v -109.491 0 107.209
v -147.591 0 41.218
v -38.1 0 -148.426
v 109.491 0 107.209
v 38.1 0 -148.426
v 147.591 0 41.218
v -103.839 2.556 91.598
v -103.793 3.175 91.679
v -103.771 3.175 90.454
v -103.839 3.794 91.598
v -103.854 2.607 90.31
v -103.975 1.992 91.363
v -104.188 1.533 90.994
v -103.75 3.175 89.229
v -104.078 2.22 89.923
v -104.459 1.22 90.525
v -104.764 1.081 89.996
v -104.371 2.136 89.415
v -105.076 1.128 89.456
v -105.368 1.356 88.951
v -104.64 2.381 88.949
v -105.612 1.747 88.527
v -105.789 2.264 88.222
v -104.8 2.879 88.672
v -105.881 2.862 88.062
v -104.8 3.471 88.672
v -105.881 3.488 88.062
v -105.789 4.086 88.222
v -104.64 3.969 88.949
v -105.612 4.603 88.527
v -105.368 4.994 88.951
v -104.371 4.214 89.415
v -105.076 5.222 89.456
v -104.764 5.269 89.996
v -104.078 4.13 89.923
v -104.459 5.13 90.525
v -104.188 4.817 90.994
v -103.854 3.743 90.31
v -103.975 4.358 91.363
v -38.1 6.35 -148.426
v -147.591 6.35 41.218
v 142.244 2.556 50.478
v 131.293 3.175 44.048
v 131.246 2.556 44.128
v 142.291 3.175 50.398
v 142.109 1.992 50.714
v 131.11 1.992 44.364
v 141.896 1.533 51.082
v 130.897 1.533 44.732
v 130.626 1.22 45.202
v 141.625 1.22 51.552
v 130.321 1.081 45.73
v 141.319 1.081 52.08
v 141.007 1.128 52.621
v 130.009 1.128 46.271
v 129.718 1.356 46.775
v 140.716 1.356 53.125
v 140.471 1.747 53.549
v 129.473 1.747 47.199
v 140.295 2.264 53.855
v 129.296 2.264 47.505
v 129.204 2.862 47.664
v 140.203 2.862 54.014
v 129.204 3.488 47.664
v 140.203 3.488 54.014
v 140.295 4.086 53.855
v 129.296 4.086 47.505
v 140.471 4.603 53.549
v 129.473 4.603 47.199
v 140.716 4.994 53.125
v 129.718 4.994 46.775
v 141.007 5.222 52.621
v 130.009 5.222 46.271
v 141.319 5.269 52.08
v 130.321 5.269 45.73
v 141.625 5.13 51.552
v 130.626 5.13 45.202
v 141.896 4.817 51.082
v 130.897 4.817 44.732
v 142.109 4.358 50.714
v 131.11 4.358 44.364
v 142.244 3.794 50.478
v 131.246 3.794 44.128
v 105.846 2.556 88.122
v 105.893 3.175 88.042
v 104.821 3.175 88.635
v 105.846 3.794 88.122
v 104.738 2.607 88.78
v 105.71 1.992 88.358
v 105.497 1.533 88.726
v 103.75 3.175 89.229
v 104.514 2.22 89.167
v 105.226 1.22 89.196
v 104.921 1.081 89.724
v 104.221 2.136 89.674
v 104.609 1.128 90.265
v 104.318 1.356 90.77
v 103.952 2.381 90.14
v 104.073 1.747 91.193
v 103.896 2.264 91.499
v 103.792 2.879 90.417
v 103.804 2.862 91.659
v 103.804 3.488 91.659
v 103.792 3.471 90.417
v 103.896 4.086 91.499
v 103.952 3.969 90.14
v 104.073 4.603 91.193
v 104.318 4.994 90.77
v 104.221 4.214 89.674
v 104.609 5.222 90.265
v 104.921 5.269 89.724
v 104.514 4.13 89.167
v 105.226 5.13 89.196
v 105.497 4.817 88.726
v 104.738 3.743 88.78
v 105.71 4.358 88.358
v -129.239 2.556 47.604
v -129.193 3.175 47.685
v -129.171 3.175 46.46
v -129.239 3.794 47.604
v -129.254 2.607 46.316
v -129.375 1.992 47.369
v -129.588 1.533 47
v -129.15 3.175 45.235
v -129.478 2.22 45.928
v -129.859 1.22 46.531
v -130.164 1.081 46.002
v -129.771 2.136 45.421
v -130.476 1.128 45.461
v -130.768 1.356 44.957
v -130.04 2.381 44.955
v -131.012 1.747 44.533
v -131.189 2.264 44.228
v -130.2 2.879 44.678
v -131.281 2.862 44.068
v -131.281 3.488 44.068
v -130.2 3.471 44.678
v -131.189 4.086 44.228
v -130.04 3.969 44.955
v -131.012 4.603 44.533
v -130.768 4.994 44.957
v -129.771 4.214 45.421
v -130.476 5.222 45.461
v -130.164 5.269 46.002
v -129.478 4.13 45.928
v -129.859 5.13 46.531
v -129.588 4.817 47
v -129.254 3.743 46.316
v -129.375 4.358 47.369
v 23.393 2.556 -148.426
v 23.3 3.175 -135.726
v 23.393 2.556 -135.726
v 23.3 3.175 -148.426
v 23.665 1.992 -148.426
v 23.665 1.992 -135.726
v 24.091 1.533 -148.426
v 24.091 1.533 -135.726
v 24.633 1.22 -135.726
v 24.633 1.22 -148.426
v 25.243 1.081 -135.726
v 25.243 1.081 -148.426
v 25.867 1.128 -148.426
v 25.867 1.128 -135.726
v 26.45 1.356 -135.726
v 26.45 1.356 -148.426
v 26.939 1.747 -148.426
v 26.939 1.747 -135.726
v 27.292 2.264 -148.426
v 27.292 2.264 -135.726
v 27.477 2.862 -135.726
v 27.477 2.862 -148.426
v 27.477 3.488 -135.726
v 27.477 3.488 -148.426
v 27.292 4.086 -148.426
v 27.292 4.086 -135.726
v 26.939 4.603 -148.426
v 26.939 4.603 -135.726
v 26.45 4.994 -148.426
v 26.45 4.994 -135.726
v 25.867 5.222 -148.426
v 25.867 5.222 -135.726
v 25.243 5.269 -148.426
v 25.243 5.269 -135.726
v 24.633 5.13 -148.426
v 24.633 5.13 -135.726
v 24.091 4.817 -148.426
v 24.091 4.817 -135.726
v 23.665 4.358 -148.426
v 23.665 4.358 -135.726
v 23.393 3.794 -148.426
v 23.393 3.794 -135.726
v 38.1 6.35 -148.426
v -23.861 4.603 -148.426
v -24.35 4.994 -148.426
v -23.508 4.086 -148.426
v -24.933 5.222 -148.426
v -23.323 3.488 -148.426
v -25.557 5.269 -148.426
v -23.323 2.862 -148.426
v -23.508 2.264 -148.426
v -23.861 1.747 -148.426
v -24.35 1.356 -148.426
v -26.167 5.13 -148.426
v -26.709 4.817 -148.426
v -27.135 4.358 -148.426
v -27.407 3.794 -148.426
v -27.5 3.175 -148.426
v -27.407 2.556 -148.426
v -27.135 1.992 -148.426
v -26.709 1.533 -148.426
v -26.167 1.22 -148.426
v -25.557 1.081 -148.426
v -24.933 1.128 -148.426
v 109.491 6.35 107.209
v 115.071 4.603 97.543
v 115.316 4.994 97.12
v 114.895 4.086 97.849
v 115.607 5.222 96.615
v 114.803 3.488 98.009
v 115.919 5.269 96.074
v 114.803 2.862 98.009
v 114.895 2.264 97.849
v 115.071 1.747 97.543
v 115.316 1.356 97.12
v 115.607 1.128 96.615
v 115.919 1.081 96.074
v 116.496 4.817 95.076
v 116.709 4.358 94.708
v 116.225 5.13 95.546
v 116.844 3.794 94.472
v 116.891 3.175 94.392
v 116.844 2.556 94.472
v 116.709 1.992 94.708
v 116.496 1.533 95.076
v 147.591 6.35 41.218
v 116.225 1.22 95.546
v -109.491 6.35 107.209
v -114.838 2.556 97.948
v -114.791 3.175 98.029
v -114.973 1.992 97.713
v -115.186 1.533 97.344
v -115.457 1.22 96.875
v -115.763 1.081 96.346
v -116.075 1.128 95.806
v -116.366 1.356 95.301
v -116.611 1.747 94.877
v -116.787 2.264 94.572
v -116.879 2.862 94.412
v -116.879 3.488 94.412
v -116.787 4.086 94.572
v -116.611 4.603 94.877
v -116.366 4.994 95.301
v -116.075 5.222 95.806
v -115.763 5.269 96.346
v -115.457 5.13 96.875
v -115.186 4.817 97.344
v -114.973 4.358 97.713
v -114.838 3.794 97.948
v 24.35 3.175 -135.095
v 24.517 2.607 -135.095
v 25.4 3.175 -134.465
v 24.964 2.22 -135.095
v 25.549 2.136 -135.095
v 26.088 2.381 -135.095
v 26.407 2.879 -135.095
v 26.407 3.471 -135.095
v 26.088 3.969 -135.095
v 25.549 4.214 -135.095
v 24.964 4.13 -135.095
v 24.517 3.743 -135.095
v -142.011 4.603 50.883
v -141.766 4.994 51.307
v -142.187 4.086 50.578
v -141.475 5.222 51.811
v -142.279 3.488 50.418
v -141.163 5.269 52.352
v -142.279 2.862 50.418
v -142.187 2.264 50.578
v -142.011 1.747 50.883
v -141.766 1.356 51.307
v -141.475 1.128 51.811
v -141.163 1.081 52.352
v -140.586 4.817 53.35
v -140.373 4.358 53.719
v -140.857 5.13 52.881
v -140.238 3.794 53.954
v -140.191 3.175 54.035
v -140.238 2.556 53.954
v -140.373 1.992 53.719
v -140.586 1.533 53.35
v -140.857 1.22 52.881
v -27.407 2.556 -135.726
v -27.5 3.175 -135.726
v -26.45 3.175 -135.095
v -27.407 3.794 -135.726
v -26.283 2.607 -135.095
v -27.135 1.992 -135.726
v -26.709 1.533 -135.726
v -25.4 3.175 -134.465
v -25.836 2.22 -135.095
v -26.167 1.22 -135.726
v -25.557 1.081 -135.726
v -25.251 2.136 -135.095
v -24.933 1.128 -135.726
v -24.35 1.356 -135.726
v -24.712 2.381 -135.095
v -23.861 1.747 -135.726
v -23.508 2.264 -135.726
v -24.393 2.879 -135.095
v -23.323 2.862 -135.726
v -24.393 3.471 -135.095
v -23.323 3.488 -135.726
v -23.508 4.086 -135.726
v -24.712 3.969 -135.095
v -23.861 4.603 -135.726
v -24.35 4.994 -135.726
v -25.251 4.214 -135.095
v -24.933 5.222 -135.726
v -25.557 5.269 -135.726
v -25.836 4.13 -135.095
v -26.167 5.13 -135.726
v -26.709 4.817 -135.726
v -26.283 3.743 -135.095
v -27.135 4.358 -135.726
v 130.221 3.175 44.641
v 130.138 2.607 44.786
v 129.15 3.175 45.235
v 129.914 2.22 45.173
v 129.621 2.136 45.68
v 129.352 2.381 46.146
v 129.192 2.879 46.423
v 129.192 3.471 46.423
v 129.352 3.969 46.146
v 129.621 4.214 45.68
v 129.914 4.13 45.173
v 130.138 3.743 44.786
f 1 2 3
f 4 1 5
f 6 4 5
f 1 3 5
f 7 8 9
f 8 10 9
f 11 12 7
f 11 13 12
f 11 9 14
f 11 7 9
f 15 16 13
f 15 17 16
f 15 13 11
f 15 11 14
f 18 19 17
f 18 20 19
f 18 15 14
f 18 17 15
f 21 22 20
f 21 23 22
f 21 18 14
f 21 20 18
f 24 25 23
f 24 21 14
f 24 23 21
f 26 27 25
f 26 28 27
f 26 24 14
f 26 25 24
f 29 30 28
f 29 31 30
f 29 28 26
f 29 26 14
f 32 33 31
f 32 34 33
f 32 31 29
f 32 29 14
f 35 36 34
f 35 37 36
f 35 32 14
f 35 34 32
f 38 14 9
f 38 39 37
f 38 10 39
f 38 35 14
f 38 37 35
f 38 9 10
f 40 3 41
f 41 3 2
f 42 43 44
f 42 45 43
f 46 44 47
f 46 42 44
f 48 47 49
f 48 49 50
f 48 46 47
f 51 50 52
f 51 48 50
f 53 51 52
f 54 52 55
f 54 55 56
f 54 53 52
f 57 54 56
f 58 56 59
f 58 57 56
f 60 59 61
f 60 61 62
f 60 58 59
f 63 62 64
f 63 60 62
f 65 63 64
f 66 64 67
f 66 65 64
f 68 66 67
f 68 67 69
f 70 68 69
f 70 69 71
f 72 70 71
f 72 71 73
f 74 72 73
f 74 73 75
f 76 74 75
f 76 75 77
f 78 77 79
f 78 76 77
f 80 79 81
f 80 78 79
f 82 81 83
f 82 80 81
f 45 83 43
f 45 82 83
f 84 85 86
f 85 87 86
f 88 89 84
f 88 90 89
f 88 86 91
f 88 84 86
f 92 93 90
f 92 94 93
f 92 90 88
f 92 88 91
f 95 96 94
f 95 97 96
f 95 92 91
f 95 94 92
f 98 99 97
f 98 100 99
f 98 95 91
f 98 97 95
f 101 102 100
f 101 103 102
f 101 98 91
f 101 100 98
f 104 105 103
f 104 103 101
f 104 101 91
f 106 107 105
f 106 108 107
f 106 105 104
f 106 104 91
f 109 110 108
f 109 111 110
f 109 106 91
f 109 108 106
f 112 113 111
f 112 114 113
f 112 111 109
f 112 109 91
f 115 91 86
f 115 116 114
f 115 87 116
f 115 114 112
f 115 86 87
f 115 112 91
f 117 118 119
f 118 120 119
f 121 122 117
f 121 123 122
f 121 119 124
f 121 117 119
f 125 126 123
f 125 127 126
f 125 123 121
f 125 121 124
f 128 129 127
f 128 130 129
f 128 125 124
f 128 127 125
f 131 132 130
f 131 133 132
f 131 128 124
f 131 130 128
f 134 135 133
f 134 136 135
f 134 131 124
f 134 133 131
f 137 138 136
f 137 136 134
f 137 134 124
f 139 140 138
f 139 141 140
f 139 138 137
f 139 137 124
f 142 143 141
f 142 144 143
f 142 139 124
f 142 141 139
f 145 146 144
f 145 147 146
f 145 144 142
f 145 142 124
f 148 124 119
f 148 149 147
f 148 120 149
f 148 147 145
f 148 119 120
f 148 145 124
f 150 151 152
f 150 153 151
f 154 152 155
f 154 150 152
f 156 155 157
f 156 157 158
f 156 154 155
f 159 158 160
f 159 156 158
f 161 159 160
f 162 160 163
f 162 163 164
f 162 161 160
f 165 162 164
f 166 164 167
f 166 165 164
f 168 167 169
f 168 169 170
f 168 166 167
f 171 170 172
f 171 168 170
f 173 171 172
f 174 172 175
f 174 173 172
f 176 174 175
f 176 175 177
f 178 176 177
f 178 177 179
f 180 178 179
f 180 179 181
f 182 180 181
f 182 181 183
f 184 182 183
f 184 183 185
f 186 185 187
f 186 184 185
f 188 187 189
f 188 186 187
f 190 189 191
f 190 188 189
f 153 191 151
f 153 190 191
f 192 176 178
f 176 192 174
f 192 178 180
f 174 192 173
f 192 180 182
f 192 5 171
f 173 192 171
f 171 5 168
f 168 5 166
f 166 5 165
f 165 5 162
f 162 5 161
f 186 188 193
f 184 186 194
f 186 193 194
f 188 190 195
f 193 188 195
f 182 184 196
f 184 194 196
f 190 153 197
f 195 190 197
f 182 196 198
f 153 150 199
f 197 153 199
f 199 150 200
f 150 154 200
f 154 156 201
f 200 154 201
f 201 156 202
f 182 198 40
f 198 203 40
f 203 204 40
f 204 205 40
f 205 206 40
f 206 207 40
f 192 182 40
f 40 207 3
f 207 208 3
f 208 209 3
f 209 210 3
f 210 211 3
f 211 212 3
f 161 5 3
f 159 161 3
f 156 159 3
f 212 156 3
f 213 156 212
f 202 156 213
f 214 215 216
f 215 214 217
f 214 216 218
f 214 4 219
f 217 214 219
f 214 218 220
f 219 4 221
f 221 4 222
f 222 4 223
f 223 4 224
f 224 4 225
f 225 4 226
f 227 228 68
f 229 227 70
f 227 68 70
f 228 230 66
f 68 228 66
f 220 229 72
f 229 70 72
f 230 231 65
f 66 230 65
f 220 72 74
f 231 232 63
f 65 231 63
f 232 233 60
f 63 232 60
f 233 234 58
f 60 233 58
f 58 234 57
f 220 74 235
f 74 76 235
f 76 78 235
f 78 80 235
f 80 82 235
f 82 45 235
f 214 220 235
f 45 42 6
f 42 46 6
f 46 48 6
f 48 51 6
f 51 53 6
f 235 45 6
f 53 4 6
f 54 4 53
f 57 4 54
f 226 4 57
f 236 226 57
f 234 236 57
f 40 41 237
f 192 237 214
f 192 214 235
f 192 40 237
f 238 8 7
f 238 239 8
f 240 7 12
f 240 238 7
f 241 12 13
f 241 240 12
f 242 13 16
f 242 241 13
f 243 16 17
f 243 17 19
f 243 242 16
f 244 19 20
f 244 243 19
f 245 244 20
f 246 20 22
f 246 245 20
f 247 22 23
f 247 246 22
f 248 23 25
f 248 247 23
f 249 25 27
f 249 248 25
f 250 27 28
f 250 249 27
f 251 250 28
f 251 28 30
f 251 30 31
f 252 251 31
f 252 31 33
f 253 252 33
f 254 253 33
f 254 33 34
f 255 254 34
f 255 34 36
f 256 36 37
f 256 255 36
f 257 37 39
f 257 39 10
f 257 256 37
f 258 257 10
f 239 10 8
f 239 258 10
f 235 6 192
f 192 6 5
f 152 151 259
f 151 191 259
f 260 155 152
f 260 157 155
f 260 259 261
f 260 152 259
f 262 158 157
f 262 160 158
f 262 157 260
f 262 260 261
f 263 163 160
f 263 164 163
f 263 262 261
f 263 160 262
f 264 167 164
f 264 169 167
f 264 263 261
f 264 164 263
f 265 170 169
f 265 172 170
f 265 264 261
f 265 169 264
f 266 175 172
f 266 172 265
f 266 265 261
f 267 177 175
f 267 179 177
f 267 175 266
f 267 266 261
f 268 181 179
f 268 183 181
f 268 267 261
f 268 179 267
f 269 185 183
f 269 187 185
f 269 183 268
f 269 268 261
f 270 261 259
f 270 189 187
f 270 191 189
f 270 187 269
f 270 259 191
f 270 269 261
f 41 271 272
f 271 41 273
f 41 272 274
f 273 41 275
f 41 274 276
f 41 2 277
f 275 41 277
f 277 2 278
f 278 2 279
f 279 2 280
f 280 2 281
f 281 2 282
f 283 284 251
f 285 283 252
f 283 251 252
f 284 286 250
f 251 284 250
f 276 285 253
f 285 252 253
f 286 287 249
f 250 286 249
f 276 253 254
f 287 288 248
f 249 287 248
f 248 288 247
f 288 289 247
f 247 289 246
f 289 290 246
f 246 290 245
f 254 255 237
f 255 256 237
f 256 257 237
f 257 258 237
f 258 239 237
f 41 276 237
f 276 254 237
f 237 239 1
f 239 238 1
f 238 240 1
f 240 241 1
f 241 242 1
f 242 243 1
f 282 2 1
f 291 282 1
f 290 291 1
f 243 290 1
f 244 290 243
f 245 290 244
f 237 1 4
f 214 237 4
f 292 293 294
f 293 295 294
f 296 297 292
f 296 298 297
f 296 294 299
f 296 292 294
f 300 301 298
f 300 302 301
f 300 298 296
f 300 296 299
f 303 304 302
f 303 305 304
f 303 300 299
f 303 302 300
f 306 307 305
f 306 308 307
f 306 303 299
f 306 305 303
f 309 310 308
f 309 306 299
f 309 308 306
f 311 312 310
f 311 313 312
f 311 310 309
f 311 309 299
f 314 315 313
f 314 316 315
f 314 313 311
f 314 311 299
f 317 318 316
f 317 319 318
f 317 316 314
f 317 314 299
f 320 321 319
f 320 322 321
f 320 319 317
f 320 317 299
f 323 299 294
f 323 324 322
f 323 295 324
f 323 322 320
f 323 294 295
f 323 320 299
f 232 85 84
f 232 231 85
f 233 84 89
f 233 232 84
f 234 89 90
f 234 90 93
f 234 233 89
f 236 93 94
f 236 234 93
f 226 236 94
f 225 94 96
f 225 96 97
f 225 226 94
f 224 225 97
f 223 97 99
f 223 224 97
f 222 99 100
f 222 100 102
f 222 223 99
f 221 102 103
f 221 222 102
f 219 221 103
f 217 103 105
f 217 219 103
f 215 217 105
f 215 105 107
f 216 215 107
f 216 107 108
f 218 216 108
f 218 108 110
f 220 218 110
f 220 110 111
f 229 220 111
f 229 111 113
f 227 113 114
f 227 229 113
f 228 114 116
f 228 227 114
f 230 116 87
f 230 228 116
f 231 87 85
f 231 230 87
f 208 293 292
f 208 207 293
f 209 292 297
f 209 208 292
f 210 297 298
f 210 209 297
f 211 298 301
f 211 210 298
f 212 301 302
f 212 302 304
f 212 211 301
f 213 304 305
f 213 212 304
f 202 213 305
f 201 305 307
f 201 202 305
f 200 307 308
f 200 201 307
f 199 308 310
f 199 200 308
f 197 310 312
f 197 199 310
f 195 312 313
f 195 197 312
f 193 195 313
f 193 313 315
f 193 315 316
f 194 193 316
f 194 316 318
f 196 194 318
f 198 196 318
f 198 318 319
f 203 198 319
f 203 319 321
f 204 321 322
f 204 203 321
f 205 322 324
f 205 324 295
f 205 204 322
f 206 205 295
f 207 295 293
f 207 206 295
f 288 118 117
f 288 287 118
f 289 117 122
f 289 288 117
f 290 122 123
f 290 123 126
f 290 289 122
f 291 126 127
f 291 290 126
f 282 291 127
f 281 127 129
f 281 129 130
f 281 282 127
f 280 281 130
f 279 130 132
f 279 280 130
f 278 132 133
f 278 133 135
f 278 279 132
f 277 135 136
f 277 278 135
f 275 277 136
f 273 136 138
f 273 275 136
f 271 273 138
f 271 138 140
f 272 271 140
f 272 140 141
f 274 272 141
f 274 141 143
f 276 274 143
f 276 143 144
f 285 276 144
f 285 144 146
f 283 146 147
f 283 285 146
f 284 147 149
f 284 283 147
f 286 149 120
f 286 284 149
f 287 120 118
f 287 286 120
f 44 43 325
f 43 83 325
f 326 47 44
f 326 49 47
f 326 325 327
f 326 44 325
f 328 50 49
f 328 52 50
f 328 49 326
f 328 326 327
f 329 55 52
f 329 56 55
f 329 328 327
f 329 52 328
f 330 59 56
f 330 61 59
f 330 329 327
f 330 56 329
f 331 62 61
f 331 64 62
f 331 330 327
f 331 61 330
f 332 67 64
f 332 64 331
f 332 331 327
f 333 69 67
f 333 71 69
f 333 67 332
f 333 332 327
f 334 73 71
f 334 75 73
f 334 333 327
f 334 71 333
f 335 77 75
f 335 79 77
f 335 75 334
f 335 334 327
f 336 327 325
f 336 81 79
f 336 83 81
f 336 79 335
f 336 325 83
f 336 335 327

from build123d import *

# Parameters (mm, degrees)
BOSS_EXTRUDE1_DEPTH            = 6.35
M5X0_8_TAPPED_HOLE1_AT_2_COUNT = 2
M5X0_8_TAPPED_HOLE1_AT_2_PITCH = 50.8
CIRPATTERN1_COUNT              = 3


with BuildPart() as part:
    # Sketch1 → Boss-Extrude1 (new body)
    with BuildSketch(Plane(origin=(0, 0, 0), x_dir=(1, 0, 0), z_dir=(0, 1, 0))):
        Polygon((-147.591032992, -41.217632116), (-109.491032992, -107.208767884), (109.491032992, -107.208767884), (147.591032992, -41.217632116), (38.1, 148.4264), (-38.1, 148.4264), align=None)
    extrude(amount=BOSS_EXTRUDE1_DEPTH)

    # Sketch3 → M5x0.8 Tapped Hole1 (revolve, cut)
    with BuildSketch(Plane(origin=(115.841032992, 3.175, 96.210245256), x_dir=(0.5, 0, -0.866025404), z_dir=(0, 1, 0))):
        Polygon((0, 0), (0, 13.9618073), (2.1, 12.7), (2.1, 0), align=None)
    m5x0_8_tapped_hole1 = revolve(axis=Axis((121.340294306, 3.175, 99.385245256), (-0.866025404, 0, -0.5)), mode=Mode.SUBTRACT)

    # M5x0.8 Tapped Hole1 at 2: M5x0.8 Tapped Hole1 ×2
    with Locations(*[Vector(0.5, 0, -0.866025404) * (i * M5X0_8_TAPPED_HOLE1_AT_2_PITCH) for i in range(1, M5X0_8_TAPPED_HOLE1_AT_2_COUNT)]):
        add(m5x0_8_tapped_hole1, mode=Mode.SUBTRACT)

    # CirPattern1: M5x0.8 Tapped Hole1 ×3 about axis
    cirpattern1_axis = Axis((0, 6.6675, 0), (0, -1, 0))
    for i in range(1, CIRPATTERN1_COUNT):
        add(m5x0_8_tapped_hole1.rotate(cirpattern1_axis, i * 360 / CIRPATTERN1_COUNT), mode=Mode.SUBTRACT)

    # CirPattern1 copy 1 sketch → CirPattern1 copy 1 (revolve, cut)
    with BuildSketch(Plane(origin=(-115.841032992, 3.175, 96.210245256), x_dir=(0.5, 0, 0.866025404), z_dir=(0, 1, 0))):
        Polygon((0, 0), (0, 13.9618073), (2.1, 12.7), (2.1, 0), align=None)
    revolve(axis=Axis((-121.340294306, 3.175, 99.385245256), (0.866025404, 0, -0.5)), mode=Mode.SUBTRACT)

    # CirPattern1 copy 2 sketch → CirPattern1 copy 2 (revolve, cut)
    with BuildSketch(Plane(origin=(-25.4, 3.175, -148.4264), x_dir=(-1, 0, 0), z_dir=(0, 1, 0))):
        Polygon((0, 0), (0, 13.9618073), (2.1, 12.7), (2.1, 0), align=None)
    revolve(axis=Axis((-25.4, 3.175, -154.7764), (0, 0, 1)), mode=Mode.SUBTRACT)


solid = part.part
